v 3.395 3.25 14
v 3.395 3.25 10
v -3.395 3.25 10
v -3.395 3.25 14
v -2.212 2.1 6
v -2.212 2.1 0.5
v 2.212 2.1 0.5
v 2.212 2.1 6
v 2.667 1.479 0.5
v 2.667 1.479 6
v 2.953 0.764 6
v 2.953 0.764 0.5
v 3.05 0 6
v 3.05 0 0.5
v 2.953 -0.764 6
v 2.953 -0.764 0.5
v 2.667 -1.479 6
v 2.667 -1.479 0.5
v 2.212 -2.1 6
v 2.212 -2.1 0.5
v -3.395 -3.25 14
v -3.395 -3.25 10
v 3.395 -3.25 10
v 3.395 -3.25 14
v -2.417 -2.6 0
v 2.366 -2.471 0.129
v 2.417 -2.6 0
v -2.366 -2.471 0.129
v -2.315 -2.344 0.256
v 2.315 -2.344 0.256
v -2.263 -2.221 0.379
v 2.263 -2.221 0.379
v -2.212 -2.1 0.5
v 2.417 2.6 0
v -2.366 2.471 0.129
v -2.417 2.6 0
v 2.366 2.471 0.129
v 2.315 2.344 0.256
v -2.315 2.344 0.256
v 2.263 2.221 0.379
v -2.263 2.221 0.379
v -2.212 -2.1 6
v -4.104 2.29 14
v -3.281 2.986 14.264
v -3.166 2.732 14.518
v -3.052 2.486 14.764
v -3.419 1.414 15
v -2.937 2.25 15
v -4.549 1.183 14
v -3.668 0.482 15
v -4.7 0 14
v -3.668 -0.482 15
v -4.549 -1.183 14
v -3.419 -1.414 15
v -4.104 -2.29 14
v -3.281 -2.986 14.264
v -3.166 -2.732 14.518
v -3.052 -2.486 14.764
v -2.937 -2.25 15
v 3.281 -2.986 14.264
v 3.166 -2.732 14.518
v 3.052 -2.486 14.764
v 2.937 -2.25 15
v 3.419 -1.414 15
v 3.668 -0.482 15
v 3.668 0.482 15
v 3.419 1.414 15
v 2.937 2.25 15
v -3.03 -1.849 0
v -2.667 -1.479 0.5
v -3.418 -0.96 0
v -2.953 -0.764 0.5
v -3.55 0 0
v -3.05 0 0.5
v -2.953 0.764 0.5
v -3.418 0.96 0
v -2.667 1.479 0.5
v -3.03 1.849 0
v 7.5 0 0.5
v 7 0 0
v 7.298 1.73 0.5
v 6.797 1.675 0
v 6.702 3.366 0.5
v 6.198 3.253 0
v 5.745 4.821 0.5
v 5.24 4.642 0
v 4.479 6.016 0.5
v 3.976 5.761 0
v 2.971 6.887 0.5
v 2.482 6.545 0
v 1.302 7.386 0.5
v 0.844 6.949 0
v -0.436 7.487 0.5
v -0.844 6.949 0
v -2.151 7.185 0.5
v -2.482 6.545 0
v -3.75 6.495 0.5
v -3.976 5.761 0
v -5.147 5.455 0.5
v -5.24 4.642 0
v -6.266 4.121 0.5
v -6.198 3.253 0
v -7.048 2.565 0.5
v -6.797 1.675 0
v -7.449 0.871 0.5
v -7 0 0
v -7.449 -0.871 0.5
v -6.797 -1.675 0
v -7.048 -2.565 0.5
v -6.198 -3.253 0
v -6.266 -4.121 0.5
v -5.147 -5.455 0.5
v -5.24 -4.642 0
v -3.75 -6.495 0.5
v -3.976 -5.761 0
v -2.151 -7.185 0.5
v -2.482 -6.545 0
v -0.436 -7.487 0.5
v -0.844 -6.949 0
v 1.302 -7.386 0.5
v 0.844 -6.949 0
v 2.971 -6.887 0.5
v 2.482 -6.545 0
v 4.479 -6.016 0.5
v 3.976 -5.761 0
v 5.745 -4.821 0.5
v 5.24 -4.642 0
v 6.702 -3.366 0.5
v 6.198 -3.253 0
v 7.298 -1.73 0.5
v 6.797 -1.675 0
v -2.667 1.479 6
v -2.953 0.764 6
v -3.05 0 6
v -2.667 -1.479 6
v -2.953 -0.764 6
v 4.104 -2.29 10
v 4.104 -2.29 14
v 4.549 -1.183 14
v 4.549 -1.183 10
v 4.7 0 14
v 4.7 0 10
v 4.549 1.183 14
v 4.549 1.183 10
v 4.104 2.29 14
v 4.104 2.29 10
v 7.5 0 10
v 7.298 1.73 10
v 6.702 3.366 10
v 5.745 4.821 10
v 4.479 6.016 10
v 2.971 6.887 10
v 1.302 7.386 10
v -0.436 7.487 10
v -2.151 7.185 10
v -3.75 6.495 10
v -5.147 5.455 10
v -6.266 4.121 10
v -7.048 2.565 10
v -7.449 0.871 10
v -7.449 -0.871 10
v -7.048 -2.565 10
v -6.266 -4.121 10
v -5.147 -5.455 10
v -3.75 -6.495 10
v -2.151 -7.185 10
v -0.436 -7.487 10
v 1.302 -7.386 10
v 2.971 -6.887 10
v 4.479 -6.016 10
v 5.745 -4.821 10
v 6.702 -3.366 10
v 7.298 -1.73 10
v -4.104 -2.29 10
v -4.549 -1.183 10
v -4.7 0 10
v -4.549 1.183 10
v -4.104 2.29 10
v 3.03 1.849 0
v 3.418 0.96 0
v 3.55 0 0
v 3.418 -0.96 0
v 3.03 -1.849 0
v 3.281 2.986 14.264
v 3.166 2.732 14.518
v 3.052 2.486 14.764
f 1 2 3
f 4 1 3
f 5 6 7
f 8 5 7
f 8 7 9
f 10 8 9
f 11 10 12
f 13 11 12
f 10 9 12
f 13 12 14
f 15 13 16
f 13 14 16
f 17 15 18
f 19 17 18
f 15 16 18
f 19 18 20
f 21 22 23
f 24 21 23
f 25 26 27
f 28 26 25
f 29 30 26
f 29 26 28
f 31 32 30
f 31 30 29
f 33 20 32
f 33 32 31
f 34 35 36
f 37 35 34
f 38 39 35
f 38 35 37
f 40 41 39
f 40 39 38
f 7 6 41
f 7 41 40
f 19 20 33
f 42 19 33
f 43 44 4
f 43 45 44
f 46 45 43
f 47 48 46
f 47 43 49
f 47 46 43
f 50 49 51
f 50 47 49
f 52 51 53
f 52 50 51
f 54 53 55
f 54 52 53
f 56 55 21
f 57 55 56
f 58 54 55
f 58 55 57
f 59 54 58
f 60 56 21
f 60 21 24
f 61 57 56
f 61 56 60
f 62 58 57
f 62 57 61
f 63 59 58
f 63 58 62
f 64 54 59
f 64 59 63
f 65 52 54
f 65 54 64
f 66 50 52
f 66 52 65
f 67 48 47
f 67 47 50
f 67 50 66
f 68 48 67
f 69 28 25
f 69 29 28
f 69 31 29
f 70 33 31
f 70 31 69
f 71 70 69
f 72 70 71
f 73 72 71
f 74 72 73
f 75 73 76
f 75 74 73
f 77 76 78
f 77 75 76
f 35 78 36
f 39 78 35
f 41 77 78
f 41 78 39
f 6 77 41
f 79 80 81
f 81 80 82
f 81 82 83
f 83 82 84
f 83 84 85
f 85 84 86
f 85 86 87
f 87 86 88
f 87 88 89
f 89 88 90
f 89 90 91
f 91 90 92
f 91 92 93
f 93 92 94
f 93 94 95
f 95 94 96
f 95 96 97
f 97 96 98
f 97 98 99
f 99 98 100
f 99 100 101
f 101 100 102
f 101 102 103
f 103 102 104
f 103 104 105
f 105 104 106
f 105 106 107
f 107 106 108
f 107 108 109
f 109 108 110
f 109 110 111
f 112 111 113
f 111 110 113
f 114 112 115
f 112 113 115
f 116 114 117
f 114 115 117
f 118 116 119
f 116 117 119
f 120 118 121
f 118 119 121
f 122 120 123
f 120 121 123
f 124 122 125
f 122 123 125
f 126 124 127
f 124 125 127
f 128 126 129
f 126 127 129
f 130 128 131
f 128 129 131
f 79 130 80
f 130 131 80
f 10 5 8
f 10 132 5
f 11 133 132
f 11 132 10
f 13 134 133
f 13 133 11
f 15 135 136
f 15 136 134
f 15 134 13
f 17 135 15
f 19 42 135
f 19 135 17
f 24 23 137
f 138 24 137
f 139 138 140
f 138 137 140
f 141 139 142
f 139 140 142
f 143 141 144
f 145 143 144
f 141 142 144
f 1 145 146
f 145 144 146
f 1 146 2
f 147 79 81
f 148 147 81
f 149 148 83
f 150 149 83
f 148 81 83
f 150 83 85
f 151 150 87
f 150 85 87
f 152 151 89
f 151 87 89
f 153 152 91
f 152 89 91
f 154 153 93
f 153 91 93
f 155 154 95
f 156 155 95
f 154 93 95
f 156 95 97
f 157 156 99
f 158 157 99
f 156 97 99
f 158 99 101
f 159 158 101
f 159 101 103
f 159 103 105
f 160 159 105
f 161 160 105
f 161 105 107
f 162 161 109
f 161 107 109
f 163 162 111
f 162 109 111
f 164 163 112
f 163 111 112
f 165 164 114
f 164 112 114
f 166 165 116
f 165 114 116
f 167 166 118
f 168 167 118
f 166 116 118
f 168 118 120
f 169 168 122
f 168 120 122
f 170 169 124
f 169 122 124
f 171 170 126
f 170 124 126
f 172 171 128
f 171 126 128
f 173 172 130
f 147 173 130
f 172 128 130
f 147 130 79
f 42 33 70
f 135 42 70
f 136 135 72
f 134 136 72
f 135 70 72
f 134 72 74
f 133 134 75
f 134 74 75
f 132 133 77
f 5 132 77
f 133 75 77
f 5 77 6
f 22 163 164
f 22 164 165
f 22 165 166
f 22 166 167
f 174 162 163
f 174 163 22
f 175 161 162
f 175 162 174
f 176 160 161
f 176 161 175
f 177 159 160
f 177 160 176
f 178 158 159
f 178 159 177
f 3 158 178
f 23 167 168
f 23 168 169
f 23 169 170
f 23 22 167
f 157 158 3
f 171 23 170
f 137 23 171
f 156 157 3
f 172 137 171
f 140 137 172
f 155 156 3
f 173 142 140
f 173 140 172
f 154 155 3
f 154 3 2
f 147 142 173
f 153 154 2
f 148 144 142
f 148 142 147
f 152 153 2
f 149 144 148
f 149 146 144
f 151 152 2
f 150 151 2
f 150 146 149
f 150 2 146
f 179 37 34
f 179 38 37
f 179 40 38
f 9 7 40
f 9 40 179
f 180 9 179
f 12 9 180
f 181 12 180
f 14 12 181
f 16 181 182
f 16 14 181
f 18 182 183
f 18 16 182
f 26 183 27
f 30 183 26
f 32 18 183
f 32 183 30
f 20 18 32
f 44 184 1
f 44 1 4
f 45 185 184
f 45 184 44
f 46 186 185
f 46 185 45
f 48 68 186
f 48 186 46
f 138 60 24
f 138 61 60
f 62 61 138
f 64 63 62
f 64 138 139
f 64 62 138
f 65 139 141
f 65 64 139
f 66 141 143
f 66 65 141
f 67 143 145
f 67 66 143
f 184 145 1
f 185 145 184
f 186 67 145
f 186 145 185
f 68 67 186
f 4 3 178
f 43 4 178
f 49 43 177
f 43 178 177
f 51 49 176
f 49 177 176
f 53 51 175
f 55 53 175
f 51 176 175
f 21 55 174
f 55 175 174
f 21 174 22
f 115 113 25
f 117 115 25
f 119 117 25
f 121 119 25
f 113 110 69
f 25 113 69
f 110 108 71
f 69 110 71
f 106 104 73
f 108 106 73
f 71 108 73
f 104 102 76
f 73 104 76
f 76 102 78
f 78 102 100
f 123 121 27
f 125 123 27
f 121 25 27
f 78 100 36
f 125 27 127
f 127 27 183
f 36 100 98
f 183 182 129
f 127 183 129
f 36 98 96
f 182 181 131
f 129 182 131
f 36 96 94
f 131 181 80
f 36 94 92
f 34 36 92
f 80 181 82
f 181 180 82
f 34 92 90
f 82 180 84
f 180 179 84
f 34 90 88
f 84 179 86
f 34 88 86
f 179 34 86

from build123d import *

# Parameters (mm, degrees)
F1_R     = 7.5
F2_DEPTH = 10
F3_START = 10
F3_DEPTH = 5
F4_SIZE  = 1
F6_DEPTH = 6
F7_SIZE  = 0.5


with BuildPart() as f2:
    # F1 (on Top) → F2 (new body)
    with BuildSketch(Plane.XY):
        Circle(F1_R)
    extrude(amount=F2_DEPTH)

    # F0 (on Top) → F3 (join)
    with BuildSketch(Plane.XY.offset(F3_START)):
        with BuildLine():
            Line((3.3952172243, 3.25), (-3.3952172243, 3.25))
            ThreePointArc((-3.3952172243, 3.25), (-4.7, 0), (-3.3952172243, -3.25))
            Line((-3.3952172243, -3.25), (3.3952172243, -3.25))
            ThreePointArc((3.3952172243, -3.25), (4.7, 0), (3.3952172243, 3.25))
        make_face()
    extrude(amount=F3_DEPTH)

    # F4
    f4_edges = [f2.edges().sort_by_distance(p)[0] for p in [
        (-4.7, 0, 15),
        (0, -3.25, 15),
        (4.7, 0, 15),
        (0, 3.25, 15),
    ]]
    chamfer(f4_edges, length=F4_SIZE)

    # F5 (on face) → F6 (cut)
    with BuildSketch(Plane(origin=(0, 0, 0), x_dir=(1, 0, 0), z_dir=(0, 0, -1))):
        with BuildLine():
            Line((-2.2118996361, -2.1), (2.2118996361, -2.1))
            ThreePointArc((2.2118996361, -2.1), (3.05, 0), (2.2118996361, 2.1))
            Line((2.2118996361, 2.1), (-2.2118996361, 2.1))
            ThreePointArc((-2.2118996361, 2.1), (-3.05, 0), (-2.2118996361, -2.1))
        make_face()
    extrude(amount=-F6_DEPTH, mode=Mode.SUBTRACT)

    # F7
    f7_edges = [f2.edges().sort_by_distance(p)[0] for p in [
        (-7.5, 0, 0),
        (0, -2.1, 0),
        (3.05, 0, 0),
        (0, 2.1, 0),
        (-3.05, 0, 0),
    ]]
    chamfer(f7_edges, length=F7_SIZE)


solid = f2.part
